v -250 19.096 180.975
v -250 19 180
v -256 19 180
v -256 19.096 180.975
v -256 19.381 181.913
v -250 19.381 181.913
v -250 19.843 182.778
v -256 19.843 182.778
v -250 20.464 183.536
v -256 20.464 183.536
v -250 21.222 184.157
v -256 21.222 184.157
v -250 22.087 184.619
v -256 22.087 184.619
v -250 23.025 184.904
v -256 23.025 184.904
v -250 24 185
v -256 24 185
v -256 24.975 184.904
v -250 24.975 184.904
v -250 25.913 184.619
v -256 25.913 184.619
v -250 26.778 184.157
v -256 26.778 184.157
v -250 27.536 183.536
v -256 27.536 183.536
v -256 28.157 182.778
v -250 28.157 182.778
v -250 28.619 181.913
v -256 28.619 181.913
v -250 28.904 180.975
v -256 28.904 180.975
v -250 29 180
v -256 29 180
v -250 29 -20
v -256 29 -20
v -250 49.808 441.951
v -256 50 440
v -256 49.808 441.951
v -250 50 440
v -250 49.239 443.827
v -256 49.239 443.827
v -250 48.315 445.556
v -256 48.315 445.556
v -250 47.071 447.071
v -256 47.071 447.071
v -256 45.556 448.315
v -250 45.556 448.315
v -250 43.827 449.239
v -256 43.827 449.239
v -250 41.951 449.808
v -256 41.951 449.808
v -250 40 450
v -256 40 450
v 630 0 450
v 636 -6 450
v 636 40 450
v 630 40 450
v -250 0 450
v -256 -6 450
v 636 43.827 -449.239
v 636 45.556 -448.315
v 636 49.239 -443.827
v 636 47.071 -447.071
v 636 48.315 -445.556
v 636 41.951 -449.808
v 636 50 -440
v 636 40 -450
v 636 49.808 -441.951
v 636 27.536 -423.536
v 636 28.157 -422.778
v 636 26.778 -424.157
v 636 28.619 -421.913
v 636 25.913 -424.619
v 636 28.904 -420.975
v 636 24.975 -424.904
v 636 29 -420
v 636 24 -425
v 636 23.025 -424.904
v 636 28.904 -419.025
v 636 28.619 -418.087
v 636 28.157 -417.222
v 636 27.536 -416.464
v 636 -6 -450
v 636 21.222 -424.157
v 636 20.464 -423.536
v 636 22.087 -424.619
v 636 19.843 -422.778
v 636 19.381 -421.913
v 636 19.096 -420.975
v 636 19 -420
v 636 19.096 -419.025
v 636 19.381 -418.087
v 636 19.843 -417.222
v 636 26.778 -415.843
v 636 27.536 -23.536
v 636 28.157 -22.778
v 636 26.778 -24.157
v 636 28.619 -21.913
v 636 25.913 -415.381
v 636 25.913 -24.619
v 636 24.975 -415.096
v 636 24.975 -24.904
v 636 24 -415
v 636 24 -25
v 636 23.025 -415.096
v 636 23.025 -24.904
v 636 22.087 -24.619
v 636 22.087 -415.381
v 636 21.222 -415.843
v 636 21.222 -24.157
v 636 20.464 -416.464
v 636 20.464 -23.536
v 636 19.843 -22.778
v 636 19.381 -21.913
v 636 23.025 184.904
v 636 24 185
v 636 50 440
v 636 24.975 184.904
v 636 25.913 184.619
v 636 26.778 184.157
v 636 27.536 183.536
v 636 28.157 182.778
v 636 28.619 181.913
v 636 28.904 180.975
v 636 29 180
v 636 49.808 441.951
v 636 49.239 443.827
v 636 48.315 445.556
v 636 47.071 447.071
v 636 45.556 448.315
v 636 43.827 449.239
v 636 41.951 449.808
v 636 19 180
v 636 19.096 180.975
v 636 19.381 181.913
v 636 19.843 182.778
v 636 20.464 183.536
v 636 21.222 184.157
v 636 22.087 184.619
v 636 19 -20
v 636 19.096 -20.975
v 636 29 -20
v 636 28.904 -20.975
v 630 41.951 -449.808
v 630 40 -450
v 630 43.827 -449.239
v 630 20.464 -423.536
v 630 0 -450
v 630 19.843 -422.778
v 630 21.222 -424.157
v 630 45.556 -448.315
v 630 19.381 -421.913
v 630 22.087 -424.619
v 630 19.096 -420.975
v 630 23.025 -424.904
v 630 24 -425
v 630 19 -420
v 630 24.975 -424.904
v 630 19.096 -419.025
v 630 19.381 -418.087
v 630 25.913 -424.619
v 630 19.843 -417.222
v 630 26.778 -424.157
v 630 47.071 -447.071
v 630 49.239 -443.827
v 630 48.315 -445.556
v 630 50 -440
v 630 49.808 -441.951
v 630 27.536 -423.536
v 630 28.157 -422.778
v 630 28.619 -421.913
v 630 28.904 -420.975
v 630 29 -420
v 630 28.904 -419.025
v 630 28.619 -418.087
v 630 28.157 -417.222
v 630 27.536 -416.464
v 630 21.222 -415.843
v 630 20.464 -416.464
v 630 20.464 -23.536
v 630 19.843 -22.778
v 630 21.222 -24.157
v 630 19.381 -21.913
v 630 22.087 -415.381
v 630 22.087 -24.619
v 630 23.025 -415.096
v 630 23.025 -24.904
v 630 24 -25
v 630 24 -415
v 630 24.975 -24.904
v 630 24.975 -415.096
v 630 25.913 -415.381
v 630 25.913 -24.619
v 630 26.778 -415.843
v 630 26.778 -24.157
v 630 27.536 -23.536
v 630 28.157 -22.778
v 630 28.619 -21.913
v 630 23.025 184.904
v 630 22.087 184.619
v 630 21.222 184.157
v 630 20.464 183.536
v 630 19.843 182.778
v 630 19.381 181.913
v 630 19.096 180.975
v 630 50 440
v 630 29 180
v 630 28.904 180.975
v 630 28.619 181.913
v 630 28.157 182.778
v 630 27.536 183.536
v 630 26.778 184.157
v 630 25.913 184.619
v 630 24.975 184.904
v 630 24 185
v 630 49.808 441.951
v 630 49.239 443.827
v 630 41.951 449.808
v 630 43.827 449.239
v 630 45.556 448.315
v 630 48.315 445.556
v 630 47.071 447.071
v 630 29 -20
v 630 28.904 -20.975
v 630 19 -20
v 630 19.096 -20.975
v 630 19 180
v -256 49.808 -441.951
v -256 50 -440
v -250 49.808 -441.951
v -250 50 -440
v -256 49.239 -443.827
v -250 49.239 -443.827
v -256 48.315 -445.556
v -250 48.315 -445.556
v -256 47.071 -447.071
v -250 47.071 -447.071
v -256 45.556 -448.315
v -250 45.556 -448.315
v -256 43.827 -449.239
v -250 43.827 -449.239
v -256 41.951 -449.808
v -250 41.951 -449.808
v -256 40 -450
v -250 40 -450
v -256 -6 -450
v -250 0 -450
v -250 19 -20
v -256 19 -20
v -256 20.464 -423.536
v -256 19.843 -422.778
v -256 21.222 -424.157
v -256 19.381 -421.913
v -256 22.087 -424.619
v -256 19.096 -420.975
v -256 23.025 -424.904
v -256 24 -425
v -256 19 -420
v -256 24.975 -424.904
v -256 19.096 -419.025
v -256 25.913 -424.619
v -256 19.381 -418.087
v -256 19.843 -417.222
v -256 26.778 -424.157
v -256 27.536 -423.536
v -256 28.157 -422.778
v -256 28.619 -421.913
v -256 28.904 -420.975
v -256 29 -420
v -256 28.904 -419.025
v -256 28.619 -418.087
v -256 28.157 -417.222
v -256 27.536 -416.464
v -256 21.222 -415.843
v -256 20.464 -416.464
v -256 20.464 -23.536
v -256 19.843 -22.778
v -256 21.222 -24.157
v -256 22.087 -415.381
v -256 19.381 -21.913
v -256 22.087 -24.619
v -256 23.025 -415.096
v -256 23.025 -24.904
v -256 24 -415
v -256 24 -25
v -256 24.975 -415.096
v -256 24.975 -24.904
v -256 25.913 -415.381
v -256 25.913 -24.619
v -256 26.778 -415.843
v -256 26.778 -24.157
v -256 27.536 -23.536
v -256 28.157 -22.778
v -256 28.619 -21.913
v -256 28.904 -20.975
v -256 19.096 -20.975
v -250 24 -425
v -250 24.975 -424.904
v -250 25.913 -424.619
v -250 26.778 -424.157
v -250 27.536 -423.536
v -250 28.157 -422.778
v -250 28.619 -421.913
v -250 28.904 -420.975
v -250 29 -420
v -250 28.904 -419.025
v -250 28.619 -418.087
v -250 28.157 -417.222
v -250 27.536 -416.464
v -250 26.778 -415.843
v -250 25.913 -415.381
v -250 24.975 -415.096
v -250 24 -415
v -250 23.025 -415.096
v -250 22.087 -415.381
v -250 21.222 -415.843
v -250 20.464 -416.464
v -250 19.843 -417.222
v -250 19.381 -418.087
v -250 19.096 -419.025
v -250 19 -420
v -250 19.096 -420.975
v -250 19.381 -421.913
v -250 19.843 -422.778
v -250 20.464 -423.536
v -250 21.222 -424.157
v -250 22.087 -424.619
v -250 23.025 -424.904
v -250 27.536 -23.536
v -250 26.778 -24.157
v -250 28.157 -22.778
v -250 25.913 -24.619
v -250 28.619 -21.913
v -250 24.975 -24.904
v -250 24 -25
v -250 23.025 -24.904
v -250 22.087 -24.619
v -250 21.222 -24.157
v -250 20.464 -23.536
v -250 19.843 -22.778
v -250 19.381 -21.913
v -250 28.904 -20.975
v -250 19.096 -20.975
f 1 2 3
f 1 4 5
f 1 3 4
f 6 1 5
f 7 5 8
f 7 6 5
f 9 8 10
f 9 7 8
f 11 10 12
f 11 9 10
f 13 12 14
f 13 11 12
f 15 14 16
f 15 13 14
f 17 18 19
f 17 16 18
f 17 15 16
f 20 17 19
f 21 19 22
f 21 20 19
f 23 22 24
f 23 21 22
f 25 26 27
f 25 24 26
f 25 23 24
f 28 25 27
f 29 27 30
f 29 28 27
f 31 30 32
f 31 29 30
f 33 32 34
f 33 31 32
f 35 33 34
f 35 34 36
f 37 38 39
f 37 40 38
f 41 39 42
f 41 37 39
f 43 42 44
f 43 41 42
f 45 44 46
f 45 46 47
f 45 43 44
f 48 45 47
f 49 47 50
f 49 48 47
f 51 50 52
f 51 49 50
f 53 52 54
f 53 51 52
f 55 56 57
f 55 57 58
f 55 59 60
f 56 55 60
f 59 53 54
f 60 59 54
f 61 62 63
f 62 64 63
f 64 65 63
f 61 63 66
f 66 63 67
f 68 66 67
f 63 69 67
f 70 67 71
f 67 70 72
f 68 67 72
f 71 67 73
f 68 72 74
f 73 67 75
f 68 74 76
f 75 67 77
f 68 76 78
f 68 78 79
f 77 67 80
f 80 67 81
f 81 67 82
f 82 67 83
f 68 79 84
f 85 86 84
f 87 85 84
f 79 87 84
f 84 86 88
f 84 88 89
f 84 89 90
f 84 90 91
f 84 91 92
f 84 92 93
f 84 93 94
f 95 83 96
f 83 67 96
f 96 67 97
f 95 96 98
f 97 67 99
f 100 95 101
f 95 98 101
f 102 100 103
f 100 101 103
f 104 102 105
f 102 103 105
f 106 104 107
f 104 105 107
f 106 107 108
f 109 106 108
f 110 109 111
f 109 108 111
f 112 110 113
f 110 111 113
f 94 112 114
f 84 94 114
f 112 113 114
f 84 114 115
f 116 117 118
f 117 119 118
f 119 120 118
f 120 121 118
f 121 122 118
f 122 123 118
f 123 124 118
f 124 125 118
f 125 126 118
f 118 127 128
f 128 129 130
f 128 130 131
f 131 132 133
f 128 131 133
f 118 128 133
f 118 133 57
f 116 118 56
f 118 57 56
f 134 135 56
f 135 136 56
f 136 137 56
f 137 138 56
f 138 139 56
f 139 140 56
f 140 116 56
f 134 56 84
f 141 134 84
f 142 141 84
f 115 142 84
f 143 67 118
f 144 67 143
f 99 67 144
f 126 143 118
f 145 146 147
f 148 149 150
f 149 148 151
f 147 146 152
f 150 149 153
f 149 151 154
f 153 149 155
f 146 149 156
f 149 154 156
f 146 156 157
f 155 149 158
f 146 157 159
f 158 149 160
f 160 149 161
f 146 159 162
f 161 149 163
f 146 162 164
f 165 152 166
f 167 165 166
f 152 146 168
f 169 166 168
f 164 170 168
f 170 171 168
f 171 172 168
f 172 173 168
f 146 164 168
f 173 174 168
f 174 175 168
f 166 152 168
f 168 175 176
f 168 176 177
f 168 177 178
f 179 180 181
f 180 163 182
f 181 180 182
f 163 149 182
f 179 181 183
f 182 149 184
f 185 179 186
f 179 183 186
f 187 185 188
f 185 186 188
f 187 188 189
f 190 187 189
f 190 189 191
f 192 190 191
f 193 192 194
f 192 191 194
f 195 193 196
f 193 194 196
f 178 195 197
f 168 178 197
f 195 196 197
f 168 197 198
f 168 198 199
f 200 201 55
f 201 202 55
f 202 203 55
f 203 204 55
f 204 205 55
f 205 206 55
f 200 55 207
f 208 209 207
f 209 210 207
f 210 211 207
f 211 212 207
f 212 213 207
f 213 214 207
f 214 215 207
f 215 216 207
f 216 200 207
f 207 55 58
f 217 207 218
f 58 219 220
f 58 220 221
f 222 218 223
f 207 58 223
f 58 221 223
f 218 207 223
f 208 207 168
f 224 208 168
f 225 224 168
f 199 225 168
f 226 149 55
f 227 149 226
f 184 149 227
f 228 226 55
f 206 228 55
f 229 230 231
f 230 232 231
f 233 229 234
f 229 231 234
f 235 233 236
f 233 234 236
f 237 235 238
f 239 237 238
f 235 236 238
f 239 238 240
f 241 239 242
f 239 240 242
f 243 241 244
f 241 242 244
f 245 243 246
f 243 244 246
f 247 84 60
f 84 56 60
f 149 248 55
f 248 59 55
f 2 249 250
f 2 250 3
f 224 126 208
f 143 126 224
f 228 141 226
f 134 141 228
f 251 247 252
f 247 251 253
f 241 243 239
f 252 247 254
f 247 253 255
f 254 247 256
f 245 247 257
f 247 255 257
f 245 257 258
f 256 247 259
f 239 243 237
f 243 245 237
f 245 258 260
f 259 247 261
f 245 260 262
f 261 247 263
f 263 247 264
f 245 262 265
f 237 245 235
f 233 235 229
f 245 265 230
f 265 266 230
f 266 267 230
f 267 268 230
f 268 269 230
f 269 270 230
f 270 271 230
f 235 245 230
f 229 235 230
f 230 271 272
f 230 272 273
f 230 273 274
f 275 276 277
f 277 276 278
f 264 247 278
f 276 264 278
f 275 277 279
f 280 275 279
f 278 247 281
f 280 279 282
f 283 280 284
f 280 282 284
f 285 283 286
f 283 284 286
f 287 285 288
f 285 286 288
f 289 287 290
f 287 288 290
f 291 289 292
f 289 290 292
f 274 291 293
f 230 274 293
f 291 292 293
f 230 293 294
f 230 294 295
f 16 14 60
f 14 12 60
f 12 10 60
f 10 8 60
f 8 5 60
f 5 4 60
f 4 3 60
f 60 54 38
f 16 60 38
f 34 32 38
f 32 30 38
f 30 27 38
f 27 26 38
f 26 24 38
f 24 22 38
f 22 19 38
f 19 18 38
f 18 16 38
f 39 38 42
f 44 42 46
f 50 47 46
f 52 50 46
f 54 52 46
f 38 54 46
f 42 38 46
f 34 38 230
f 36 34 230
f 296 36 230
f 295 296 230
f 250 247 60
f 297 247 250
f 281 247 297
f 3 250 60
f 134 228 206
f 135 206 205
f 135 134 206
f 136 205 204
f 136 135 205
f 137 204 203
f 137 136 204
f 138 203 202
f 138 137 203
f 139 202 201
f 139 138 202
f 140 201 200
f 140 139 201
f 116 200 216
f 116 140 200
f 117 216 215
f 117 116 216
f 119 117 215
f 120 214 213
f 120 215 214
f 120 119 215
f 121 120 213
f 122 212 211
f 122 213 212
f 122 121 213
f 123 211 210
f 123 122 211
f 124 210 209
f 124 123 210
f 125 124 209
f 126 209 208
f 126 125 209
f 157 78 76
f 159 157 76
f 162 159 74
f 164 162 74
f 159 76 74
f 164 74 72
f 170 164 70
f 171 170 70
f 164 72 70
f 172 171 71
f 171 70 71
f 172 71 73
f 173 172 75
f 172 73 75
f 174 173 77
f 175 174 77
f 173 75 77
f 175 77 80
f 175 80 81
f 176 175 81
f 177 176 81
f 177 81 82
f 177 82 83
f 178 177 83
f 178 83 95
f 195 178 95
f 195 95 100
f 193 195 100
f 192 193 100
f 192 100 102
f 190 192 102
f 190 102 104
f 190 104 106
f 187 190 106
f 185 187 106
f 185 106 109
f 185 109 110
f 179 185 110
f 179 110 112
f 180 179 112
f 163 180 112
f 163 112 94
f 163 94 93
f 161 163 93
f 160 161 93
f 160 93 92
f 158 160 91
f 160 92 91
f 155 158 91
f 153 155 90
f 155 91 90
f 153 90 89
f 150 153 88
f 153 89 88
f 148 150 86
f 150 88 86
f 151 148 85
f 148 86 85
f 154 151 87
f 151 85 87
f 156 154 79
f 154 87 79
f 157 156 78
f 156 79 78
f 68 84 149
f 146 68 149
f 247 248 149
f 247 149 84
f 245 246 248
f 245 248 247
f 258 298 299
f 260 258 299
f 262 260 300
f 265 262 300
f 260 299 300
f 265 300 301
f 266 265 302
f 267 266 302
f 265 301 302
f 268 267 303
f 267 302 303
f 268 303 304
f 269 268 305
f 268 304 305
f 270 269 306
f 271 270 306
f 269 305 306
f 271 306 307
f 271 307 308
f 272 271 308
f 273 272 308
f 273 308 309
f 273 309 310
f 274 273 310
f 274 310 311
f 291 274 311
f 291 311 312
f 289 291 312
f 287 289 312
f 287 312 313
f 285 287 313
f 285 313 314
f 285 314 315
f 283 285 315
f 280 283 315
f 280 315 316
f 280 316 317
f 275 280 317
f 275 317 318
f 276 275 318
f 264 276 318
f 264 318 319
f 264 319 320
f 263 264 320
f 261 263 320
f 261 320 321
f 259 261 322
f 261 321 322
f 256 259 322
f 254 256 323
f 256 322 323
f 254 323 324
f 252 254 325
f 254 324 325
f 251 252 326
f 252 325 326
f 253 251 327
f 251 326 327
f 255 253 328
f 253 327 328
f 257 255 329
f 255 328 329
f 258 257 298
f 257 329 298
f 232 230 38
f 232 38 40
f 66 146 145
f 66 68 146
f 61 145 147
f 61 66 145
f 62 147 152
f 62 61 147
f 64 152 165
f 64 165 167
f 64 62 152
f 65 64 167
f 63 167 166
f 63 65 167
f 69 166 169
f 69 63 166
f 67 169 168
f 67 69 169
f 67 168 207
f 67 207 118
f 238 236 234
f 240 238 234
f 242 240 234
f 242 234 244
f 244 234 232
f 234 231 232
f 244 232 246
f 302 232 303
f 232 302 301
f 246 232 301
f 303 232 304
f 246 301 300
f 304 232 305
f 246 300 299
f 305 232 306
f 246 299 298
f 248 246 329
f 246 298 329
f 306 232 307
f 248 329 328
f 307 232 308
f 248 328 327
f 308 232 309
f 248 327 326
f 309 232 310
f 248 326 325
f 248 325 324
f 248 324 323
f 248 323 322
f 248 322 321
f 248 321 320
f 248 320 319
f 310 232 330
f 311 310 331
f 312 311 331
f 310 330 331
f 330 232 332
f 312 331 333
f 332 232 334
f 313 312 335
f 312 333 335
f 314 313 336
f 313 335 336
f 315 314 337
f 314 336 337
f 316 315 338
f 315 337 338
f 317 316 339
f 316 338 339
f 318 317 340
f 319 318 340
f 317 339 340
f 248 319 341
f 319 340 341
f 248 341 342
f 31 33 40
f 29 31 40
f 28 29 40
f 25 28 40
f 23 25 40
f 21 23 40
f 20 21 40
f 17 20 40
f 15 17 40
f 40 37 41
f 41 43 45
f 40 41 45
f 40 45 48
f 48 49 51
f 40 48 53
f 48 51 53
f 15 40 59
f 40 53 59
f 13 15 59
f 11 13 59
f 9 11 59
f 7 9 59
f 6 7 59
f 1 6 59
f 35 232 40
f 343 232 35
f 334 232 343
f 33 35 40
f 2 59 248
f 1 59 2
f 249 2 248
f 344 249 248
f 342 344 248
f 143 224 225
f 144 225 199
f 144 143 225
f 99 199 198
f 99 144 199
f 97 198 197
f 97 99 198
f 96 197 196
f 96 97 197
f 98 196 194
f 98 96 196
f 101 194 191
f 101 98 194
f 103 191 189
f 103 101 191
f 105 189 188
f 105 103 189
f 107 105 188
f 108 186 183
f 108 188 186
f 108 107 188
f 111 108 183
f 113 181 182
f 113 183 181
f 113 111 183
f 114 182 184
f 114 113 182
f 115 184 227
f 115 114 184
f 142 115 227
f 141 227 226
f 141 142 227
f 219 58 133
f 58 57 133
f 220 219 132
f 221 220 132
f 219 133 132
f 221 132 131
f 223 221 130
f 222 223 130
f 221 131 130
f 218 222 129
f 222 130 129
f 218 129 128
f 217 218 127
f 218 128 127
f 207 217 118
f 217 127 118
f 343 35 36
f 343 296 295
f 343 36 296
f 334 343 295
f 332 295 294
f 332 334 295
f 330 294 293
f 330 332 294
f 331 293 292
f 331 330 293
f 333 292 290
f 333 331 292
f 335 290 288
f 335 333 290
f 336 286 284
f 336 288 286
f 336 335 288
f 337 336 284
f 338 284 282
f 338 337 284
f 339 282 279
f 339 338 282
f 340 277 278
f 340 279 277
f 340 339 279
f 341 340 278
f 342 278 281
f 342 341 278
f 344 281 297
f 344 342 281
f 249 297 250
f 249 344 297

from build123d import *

# Parameters (mm, degrees)
EXTRUDE_THIN1_DEPTH = 450
SKETCH2_R           = 5
CUT_EXTRUDE1_DEPTH  = 893
FILLET1_R           = 10


with BuildPart() as part:
    # Sketch1 → Extrude-Thin1 (new body, symmetric)
    with BuildSketch(Plane.XY):
        Polygon((-250, 50), (-250, 0), (630, 0), (630, 50), (636, 50), (636, -6), (-256, -6), (-256, 50), align=None)
    extrude(amount=EXTRUDE_THIN1_DEPTH, both=True)

    # Sketch2 → Cut-Extrude1 (cut, through all)
    with BuildSketch(Plane(origin=(636, 0, 0), x_dir=(0, 0, -1), z_dir=(1, 0, 0))):
        with Locations((420, 24)):
            Circle(SKETCH2_R)
        with BuildLine():
            Line((20, 19), (-180, 19))
            ThreePointArc((-180, 19), (-185, 24), (-180, 29))
            Line((-180, 29), (20, 29))
            ThreePointArc((20, 29), (25, 24), (20, 19))
        make_face()
    extrude(amount=-CUT_EXTRUDE1_DEPTH, mode=Mode.SUBTRACT)

    # Fillet1
    fillet1_edges = [part.edges().sort_by_distance(p)[0] for p in [
        (-253, 50, 450),
        (-253, 50, -450),
        (633, 50, 450),
        (633, 50, -450),
    ]]
    fillet(fillet1_edges, radius=FILLET1_R)


solid = part.part
